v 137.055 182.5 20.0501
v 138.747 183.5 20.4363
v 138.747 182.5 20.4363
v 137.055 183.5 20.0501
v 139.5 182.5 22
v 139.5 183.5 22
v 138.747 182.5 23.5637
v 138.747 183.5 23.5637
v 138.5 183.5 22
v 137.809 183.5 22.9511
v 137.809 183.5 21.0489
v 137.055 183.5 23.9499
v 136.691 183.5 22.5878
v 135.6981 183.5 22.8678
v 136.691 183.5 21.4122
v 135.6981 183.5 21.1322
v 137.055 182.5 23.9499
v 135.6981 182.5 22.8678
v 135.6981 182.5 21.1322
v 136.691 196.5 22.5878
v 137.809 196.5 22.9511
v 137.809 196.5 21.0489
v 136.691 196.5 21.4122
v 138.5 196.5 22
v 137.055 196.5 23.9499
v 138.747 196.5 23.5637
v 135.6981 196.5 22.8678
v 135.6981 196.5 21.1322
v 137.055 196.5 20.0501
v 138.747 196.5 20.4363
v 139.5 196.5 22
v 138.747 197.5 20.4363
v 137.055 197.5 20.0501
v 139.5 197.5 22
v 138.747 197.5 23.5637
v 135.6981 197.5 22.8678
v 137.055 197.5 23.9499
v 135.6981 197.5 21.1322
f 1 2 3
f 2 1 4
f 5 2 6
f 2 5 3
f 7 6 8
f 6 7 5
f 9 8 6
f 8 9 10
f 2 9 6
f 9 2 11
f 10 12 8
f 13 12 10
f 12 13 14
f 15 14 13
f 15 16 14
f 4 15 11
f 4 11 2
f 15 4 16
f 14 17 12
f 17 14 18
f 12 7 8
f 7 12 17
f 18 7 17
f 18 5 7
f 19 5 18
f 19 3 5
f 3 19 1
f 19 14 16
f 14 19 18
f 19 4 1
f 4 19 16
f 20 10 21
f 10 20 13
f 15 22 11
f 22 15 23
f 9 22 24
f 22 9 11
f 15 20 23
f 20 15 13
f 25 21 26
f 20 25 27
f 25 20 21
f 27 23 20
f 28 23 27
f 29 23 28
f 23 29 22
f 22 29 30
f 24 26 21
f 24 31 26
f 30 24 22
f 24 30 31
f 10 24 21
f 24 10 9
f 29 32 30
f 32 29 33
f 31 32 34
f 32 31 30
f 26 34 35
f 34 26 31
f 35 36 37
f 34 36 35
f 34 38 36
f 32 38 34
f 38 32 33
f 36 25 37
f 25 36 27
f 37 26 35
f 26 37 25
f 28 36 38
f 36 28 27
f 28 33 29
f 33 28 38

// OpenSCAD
// Generated from the same CSG operations as STEP. Rebuild with spec/build_parent_hand_service.py.
translate([137.5,182.5,22]) rotate([-90,0,0]) union(){cylinder(r=2,h=1);translate([0,0,1]) cylinder(r=1,h=13);translate([0,0,14]) cylinder(r=2,h=1);}
